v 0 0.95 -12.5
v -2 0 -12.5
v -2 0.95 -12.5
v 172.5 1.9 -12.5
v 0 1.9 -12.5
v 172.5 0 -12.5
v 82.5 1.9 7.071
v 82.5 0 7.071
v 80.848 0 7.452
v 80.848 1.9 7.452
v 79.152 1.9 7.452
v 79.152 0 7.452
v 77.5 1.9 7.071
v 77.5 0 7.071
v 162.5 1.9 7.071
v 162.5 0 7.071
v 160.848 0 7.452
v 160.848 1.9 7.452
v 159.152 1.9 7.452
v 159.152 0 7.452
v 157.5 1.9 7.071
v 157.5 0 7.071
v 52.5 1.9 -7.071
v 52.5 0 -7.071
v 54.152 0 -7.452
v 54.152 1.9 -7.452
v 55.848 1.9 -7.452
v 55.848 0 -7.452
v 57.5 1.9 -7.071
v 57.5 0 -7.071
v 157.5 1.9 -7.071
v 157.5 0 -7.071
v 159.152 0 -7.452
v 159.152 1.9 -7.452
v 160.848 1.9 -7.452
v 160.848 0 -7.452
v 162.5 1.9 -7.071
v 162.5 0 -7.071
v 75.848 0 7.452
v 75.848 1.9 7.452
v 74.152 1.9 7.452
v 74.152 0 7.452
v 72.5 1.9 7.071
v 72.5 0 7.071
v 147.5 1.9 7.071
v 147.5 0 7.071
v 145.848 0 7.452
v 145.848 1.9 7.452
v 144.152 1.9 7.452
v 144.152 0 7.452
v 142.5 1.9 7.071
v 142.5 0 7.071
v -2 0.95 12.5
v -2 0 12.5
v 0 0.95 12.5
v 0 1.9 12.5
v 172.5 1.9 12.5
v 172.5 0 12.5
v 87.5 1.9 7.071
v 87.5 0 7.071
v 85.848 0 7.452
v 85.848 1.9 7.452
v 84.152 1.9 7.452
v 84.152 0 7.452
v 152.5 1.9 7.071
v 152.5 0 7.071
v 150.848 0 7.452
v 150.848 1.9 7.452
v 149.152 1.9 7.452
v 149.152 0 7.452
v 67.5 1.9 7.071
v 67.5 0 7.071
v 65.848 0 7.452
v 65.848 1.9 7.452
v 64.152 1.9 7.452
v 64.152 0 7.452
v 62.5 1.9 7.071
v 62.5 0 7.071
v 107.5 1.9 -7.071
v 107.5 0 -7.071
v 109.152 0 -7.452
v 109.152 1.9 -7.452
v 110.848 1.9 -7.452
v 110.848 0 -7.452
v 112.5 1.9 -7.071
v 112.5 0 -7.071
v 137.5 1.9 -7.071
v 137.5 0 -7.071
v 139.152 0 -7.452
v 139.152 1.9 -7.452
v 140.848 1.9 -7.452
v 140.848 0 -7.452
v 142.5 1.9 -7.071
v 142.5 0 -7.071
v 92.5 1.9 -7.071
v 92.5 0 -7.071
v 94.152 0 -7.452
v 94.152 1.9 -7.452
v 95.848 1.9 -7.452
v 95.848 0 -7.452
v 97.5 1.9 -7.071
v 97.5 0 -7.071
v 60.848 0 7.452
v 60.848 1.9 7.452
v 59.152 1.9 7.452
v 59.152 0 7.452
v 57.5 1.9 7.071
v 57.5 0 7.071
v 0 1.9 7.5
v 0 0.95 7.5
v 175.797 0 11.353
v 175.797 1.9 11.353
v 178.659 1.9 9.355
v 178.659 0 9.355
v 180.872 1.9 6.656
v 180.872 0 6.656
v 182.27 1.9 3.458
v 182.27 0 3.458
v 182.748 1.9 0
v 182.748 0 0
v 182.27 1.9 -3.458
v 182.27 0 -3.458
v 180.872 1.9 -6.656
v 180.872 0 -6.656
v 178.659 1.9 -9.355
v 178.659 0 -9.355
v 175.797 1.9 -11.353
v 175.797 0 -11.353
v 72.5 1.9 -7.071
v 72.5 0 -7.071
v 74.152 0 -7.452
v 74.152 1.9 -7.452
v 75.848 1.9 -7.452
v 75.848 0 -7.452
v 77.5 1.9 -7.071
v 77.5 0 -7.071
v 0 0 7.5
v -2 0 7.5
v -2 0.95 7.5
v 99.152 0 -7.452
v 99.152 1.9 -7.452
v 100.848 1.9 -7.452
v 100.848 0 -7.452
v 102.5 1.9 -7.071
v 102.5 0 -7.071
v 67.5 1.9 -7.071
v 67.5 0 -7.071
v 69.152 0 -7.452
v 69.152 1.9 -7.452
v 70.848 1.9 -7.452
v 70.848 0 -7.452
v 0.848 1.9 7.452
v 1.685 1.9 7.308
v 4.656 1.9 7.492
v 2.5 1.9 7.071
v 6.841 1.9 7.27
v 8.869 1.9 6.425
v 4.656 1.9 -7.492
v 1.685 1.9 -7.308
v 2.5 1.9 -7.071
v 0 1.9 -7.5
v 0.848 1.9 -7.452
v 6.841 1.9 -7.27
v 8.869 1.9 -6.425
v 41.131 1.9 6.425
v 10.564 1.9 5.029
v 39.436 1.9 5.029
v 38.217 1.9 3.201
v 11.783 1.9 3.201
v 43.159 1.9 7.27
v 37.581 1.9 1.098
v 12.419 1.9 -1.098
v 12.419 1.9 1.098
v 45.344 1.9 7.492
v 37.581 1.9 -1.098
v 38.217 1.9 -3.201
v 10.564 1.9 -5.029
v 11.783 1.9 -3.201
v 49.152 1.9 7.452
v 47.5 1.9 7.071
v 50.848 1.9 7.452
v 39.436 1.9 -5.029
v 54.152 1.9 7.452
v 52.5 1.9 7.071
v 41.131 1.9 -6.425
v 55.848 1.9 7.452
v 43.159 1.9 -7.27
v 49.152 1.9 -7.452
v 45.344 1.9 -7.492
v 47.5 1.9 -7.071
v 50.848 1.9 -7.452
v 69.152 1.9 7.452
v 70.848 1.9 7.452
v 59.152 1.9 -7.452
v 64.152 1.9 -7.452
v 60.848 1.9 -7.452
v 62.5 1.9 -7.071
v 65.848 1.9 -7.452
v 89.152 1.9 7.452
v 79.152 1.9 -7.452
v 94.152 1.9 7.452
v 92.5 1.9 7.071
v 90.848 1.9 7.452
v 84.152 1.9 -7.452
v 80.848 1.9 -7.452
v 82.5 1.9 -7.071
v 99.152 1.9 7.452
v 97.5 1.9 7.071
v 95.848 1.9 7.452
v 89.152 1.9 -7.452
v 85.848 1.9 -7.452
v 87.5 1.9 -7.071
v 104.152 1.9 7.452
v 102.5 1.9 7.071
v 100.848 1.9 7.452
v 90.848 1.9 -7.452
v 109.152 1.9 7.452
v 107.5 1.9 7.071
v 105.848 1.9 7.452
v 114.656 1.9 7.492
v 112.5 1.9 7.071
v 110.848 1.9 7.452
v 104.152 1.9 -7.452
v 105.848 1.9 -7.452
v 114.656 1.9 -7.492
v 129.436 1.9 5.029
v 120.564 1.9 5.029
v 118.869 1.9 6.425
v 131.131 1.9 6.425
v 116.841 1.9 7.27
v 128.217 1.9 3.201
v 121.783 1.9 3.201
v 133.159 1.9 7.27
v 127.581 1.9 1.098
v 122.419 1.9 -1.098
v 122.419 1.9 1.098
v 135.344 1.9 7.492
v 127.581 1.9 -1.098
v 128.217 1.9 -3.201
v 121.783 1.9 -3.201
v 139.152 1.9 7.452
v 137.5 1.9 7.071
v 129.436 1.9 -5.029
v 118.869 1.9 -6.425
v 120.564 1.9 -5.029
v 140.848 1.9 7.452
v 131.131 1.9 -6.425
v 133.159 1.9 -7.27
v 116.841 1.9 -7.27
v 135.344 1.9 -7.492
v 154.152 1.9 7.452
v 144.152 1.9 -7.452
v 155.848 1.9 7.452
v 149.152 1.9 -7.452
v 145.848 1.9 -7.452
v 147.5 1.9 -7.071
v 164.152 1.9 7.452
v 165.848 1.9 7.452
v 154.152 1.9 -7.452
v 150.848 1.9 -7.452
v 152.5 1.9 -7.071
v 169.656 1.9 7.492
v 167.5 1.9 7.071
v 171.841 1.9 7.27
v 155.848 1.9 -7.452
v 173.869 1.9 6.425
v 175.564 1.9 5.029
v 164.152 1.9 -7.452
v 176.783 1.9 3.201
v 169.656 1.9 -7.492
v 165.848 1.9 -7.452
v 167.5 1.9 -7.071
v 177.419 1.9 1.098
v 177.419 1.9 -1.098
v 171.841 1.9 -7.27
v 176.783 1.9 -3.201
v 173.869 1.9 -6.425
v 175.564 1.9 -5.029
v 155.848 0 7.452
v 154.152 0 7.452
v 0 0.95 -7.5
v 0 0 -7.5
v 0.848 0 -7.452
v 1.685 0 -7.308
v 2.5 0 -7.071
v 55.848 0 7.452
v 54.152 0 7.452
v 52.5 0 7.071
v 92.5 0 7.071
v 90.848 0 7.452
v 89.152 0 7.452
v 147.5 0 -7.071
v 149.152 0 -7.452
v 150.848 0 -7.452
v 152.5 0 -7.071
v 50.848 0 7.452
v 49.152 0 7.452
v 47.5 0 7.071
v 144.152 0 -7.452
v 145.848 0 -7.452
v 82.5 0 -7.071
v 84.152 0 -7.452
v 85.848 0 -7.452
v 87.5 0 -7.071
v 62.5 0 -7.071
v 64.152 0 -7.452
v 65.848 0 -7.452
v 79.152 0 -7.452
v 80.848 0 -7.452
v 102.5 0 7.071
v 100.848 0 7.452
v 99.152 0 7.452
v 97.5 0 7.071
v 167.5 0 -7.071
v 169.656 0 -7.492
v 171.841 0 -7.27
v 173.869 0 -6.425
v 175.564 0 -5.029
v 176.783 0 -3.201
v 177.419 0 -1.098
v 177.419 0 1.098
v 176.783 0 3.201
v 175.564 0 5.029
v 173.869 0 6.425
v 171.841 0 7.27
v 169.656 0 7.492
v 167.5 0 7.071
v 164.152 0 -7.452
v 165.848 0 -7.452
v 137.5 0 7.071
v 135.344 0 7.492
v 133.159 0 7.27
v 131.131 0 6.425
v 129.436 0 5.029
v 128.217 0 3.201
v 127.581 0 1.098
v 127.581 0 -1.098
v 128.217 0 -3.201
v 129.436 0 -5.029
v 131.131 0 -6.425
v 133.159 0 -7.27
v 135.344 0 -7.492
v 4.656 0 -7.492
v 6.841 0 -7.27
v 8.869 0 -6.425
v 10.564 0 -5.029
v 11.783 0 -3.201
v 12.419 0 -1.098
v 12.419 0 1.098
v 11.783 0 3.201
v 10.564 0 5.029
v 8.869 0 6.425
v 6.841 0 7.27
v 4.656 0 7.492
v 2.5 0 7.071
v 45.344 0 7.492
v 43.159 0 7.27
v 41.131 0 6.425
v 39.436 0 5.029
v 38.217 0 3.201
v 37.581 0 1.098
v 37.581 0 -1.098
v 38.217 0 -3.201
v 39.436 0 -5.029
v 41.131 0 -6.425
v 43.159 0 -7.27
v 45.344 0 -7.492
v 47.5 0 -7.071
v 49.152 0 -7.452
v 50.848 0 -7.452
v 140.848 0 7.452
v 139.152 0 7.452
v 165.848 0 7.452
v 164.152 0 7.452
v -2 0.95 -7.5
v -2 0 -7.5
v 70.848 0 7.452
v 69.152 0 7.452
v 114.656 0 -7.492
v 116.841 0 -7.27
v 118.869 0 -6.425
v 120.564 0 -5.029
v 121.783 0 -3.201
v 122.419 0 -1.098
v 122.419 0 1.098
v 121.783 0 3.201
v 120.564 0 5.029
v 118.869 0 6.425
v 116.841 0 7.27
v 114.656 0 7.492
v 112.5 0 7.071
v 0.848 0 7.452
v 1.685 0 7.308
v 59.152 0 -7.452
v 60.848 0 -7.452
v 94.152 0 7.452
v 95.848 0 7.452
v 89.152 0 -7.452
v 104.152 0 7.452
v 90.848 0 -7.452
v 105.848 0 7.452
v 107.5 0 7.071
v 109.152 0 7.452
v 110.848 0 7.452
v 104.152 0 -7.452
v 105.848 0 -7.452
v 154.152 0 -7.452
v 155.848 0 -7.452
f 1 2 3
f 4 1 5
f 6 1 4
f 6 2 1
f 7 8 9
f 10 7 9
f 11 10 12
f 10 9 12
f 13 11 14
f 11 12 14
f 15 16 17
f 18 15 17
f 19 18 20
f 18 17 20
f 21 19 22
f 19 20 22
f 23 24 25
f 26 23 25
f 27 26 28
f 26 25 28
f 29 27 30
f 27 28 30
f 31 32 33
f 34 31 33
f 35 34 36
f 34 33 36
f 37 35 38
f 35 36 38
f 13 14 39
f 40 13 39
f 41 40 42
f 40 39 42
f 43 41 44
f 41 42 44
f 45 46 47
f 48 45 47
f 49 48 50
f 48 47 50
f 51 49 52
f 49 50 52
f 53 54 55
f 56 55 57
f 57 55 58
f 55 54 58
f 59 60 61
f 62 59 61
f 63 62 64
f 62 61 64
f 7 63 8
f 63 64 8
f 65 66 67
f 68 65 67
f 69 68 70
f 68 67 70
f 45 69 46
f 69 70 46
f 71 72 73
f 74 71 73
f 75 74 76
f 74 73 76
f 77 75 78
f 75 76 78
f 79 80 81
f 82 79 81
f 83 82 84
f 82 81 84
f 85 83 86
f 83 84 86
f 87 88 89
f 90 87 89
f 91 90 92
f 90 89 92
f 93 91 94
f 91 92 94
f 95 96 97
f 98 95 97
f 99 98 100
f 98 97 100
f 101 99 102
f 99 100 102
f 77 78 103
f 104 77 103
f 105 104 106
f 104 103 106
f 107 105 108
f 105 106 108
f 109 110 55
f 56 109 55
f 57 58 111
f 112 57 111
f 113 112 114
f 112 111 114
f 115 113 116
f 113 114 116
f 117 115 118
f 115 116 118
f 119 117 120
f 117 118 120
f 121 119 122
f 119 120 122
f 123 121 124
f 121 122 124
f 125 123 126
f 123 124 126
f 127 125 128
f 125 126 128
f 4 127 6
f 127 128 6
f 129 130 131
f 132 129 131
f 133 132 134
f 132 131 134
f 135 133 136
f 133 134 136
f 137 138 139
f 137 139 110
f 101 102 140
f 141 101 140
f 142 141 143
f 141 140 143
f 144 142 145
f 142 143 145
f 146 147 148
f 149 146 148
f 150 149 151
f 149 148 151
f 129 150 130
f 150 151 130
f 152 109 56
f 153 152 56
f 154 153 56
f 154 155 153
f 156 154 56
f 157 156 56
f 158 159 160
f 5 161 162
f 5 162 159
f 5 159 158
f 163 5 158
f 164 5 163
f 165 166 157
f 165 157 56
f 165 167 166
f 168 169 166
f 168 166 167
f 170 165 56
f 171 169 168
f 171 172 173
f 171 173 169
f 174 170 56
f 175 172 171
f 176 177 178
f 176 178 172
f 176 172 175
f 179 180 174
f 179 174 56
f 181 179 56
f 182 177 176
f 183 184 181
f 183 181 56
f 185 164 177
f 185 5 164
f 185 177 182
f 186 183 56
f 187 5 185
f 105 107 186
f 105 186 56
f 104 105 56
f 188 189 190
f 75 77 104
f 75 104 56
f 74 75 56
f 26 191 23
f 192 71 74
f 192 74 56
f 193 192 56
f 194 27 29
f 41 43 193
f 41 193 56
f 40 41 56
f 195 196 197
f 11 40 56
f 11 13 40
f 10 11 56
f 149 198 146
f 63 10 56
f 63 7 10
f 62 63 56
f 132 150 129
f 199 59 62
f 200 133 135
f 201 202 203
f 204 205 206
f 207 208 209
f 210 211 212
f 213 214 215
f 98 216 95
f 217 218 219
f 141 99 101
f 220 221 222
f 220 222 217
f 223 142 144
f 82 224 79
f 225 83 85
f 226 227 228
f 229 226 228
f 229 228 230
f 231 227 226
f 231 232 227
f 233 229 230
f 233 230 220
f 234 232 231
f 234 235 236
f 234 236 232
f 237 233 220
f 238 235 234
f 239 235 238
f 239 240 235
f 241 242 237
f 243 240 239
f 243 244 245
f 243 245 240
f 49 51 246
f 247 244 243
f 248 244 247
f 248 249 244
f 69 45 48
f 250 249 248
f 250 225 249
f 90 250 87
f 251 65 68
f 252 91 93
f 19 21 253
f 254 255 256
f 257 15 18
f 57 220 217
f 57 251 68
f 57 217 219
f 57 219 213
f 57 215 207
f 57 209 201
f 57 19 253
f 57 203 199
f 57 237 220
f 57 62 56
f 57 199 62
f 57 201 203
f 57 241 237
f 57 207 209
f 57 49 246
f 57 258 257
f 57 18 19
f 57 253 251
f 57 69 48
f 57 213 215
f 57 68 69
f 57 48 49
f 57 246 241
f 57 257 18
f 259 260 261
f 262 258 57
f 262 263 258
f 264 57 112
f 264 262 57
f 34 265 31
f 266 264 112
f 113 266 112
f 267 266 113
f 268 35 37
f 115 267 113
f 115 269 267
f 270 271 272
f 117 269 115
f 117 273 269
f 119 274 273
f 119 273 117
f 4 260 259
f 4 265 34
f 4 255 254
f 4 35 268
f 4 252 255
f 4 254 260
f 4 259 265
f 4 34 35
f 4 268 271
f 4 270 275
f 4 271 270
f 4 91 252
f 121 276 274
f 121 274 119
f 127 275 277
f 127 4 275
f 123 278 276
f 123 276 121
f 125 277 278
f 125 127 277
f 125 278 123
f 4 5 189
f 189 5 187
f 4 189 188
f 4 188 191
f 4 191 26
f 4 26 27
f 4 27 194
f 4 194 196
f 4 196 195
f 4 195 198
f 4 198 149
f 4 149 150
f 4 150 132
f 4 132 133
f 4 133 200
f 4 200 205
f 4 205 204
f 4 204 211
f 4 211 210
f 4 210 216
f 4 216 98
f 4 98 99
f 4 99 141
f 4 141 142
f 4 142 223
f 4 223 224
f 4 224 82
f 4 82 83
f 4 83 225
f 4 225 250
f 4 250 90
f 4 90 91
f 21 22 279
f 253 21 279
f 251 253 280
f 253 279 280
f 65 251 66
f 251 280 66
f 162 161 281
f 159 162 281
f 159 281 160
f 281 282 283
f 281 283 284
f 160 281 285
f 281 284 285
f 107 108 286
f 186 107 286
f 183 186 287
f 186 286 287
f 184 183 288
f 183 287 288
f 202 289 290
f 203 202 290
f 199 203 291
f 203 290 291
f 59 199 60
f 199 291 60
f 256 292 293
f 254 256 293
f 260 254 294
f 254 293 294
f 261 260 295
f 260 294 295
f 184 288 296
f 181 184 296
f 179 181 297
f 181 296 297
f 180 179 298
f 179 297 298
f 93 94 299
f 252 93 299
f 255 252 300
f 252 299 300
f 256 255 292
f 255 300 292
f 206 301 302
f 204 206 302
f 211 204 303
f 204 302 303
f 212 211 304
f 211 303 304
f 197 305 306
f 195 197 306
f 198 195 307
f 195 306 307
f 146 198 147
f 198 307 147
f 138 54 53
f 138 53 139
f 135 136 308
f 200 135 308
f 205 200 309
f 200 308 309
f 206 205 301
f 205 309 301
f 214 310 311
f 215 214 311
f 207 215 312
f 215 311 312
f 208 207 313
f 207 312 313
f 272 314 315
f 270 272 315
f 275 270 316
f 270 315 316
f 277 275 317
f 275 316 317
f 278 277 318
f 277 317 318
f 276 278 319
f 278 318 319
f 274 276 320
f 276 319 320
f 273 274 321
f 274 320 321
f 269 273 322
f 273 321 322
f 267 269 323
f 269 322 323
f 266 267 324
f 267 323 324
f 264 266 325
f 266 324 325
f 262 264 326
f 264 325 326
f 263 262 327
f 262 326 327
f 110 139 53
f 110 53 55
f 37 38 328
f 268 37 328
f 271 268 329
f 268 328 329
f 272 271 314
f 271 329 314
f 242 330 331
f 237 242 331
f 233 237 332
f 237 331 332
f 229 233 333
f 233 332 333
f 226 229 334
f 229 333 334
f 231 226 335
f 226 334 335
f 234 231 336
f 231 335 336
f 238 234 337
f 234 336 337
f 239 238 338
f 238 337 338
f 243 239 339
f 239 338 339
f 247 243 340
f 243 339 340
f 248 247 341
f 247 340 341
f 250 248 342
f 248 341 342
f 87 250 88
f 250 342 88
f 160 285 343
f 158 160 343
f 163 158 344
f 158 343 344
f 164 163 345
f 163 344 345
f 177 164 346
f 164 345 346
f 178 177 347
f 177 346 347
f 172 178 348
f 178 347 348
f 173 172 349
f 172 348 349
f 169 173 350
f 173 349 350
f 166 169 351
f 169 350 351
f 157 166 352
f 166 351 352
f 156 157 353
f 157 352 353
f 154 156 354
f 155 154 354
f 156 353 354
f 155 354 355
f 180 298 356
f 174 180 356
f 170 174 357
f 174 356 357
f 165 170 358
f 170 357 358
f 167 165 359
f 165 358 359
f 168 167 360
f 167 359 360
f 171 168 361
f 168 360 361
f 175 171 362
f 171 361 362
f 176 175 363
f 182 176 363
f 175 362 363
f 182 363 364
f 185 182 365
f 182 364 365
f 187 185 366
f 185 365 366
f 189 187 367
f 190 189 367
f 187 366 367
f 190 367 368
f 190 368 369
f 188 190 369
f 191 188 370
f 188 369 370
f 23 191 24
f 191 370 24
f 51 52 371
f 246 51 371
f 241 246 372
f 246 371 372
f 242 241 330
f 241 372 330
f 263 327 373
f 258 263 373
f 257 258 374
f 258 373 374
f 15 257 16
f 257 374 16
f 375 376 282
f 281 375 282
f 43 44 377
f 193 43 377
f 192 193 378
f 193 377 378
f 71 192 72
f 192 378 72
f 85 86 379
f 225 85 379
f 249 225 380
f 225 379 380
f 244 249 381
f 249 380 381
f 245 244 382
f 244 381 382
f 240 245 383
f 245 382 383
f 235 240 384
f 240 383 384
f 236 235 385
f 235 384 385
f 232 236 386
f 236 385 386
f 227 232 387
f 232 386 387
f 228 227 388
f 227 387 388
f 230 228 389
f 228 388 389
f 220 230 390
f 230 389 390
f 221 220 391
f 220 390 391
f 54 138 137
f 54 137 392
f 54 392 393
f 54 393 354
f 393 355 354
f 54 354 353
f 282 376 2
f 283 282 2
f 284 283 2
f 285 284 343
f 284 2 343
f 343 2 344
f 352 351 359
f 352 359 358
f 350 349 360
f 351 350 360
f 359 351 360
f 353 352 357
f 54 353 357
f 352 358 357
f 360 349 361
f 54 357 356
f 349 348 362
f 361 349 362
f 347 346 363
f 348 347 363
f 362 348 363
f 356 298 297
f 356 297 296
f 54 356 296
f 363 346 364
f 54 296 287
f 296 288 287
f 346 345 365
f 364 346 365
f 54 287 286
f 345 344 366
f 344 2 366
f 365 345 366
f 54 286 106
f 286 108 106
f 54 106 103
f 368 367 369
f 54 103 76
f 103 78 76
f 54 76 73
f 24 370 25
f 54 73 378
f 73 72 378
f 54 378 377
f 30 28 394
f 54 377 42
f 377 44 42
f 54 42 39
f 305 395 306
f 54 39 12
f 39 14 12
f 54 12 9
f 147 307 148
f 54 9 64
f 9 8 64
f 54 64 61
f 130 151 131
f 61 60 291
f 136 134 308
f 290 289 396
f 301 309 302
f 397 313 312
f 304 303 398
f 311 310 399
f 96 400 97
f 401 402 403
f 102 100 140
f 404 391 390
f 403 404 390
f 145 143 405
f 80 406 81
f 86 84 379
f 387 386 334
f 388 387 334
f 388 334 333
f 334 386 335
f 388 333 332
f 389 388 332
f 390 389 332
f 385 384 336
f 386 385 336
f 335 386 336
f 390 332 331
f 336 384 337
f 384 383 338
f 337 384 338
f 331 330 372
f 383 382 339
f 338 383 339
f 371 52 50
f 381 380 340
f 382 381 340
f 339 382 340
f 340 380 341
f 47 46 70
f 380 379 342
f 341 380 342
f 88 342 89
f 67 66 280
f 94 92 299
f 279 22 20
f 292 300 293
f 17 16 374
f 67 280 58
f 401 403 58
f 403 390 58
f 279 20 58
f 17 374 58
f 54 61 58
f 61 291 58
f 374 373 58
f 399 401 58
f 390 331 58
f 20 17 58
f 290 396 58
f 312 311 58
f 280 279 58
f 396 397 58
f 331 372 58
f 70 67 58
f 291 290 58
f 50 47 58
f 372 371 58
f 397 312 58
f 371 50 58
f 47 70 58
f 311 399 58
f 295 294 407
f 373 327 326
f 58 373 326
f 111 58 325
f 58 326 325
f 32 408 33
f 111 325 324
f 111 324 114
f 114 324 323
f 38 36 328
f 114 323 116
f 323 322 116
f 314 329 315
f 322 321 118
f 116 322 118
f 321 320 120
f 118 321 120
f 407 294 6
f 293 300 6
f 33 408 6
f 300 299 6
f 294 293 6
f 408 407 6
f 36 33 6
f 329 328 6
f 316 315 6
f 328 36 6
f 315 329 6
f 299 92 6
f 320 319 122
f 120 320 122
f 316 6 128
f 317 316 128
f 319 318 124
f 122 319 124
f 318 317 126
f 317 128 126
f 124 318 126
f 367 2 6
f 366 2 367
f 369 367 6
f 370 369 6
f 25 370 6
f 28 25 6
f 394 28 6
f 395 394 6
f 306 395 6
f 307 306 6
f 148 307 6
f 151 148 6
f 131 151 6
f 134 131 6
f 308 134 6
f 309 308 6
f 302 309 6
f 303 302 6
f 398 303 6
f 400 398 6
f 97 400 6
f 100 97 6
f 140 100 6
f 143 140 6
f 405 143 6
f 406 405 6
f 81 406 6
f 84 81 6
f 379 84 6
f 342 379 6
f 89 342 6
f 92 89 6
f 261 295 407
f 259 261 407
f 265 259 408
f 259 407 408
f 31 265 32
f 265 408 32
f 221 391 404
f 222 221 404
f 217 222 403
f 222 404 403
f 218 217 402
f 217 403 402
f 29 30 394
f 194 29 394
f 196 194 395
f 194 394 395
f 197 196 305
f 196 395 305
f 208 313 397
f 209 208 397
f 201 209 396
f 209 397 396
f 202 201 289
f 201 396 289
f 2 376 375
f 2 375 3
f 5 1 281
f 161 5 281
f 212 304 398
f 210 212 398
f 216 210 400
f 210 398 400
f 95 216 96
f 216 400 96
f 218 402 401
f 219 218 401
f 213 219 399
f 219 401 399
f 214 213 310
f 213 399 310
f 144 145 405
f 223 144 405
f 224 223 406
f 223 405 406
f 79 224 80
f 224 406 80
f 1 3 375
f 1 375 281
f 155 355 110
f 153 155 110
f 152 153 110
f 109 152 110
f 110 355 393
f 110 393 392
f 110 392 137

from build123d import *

# Parameters (mm, degrees)
BOSS_EXTRUDE1_DEPTH = 1.9
SKETCH2_W           = 2
SKETCH2_H           = 5
BOSS_EXTRUDE2_DEPTH = 0.95


with BuildPart() as part:
    # Sketch1 → Boss-Extrude1 (new body)
    with BuildSketch(Plane(origin=(0, 0, 0), x_dir=(1, 0, 0), z_dir=(0, 1, 0))):
        with BuildLine():
            Line((172.5, 12.5), (0, 12.5))
            Line((0, 12.5), (0, 7.5))
            ThreePointArc((0, 7.5), (1.26826484, 7.391989197), (2.5, 7.071067812))
            ThreePointArc((2.5, 7.071067812), (12.5, 0), (2.5, -7.071067812))
            ThreePointArc((2.5, -7.071067812), (1.26826484, -7.391989197), (0, -7.5))
            Line((0, -7.5), (0, -12.5))
            Line((0, -12.5), (172.5, -12.5))
            ThreePointArc((172.5, -12.5), (182.747548784, 0), (172.5, 12.5))
        make_face()
        with BuildLine():
            ThreePointArc((47.5, -7.071067812), (37.5, 0), (47.5, 7.071067812))
            ThreePointArc((47.5, 7.071067812), (50, 7.5), (52.5, 7.071067812))
            ThreePointArc((52.5, 7.071067812), (55, 7.5), (57.5, 7.071067812))
            ThreePointArc((57.5, 7.071067812), (60, 7.5), (62.5, 7.071067812))
            ThreePointArc((62.5, 7.071067812), (65, 7.5), (67.5, 7.071067812))
            ThreePointArc((67.5, 7.071067812), (70, 7.5), (72.5, 7.071067812))
            ThreePointArc((72.5, 7.071067812), (75, 7.5), (77.5, 7.071067812))
            ThreePointArc((77.5, 7.071067812), (80, 7.5), (82.5, 7.071067812))
            ThreePointArc((82.5, 7.071067812), (85, 7.5), (87.5, 7.071067812))
            ThreePointArc((87.5, 7.071067812), (90, 7.5), (92.5, 7.071067812))
            ThreePointArc((92.5, 7.071067812), (95, 7.5), (97.5, 7.071067812))
            ThreePointArc((97.5, 7.071067812), (100, 7.5), (102.5, 7.071067812))
            ThreePointArc((102.5, 7.071067812), (105, 7.5), (107.5, 7.071067812))
            ThreePointArc((107.5, 7.071067812), (110, 7.5), (112.5, 7.071067812))
            ThreePointArc((112.5, 7.071067812), (122.5, 0), (112.5, -7.071067812))
            ThreePointArc((112.5, -7.071067812), (110, -7.5), (107.5, -7.071067812))
            ThreePointArc((107.5, -7.071067812), (105, -7.5), (102.5, -7.071067812))
            ThreePointArc((102.5, -7.071067812), (100, -7.5), (97.5, -7.071067812))
            ThreePointArc((97.5, -7.071067812), (95, -7.5), (92.5, -7.071067812))
            ThreePointArc((92.5, -7.071067812), (90, -7.5), (87.5, -7.071067812))
            ThreePointArc((87.5, -7.071067812), (85, -7.5), (82.5, -7.071067812))
            ThreePointArc((82.5, -7.071067812), (80, -7.5), (77.5, -7.071067812))
            ThreePointArc((77.5, -7.071067812), (75, -7.5), (72.5, -7.071067812))
            ThreePointArc((72.5, -7.071067812), (70, -7.5), (67.5, -7.071067812))
            ThreePointArc((67.5, -7.071067812), (65, -7.5), (62.5, -7.071067812))
            ThreePointArc((62.5, -7.071067812), (60, -7.5), (57.5, -7.071067812))
            ThreePointArc((57.5, -7.071067812), (55, -7.5), (52.5, -7.071067812))
            ThreePointArc((52.5, -7.071067812), (50, -7.5), (47.5, -7.071067812))
        make_face(mode=Mode.SUBTRACT)
        with BuildLine():
            ThreePointArc((137.5, 7.071067812), (140, 7.5), (142.5, 7.071067812))
            ThreePointArc((142.5, 7.071067812), (145, 7.5), (147.5, 7.071067812))
            ThreePointArc((147.5, 7.071067812), (150, 7.5), (152.5, 7.071067812))
            ThreePointArc((152.5, 7.071067812), (155, 7.5), (157.5, 7.071067812))
            ThreePointArc((157.5, 7.071067812), (160, 7.5), (162.5, 7.071067812))
            ThreePointArc((162.5, 7.071067812), (165, 7.5), (167.5, 7.071067812))
            ThreePointArc((167.5, 7.071067812), (177.5, 0), (167.5, -7.071067812))
            ThreePointArc((167.5, -7.071067812), (165, -7.5), (162.5, -7.071067812))
            ThreePointArc((162.5, -7.071067812), (160, -7.5), (157.5, -7.071067812))
            ThreePointArc((157.5, -7.071067812), (155, -7.5), (152.5, -7.071067812))
            ThreePointArc((152.5, -7.071067812), (150, -7.5), (147.5, -7.071067812))
            ThreePointArc((147.5, -7.071067812), (145, -7.5), (142.5, -7.071067812))
            ThreePointArc((142.5, -7.071067812), (140, -7.5), (137.5, -7.071067812))
            ThreePointArc((137.5, -7.071067812), (127.5, 0), (137.5, 7.071067812))
        make_face(mode=Mode.SUBTRACT)
    extrude(amount=BOSS_EXTRUDE1_DEPTH)

    # Sketch2 → Boss-Extrude2 (add)
    with BuildSketch(Plane(origin=(0, 0, 0), x_dir=(1, 0, 0), z_dir=(0, 1, 0))):
        with Locations((-1, 10)):
            Rectangle(SKETCH2_W, SKETCH2_H)
        with Locations((-1, -10)):
            Rectangle(SKETCH2_W, SKETCH2_H)
    extrude(amount=BOSS_EXTRUDE2_DEPTH)


solid = part.part
